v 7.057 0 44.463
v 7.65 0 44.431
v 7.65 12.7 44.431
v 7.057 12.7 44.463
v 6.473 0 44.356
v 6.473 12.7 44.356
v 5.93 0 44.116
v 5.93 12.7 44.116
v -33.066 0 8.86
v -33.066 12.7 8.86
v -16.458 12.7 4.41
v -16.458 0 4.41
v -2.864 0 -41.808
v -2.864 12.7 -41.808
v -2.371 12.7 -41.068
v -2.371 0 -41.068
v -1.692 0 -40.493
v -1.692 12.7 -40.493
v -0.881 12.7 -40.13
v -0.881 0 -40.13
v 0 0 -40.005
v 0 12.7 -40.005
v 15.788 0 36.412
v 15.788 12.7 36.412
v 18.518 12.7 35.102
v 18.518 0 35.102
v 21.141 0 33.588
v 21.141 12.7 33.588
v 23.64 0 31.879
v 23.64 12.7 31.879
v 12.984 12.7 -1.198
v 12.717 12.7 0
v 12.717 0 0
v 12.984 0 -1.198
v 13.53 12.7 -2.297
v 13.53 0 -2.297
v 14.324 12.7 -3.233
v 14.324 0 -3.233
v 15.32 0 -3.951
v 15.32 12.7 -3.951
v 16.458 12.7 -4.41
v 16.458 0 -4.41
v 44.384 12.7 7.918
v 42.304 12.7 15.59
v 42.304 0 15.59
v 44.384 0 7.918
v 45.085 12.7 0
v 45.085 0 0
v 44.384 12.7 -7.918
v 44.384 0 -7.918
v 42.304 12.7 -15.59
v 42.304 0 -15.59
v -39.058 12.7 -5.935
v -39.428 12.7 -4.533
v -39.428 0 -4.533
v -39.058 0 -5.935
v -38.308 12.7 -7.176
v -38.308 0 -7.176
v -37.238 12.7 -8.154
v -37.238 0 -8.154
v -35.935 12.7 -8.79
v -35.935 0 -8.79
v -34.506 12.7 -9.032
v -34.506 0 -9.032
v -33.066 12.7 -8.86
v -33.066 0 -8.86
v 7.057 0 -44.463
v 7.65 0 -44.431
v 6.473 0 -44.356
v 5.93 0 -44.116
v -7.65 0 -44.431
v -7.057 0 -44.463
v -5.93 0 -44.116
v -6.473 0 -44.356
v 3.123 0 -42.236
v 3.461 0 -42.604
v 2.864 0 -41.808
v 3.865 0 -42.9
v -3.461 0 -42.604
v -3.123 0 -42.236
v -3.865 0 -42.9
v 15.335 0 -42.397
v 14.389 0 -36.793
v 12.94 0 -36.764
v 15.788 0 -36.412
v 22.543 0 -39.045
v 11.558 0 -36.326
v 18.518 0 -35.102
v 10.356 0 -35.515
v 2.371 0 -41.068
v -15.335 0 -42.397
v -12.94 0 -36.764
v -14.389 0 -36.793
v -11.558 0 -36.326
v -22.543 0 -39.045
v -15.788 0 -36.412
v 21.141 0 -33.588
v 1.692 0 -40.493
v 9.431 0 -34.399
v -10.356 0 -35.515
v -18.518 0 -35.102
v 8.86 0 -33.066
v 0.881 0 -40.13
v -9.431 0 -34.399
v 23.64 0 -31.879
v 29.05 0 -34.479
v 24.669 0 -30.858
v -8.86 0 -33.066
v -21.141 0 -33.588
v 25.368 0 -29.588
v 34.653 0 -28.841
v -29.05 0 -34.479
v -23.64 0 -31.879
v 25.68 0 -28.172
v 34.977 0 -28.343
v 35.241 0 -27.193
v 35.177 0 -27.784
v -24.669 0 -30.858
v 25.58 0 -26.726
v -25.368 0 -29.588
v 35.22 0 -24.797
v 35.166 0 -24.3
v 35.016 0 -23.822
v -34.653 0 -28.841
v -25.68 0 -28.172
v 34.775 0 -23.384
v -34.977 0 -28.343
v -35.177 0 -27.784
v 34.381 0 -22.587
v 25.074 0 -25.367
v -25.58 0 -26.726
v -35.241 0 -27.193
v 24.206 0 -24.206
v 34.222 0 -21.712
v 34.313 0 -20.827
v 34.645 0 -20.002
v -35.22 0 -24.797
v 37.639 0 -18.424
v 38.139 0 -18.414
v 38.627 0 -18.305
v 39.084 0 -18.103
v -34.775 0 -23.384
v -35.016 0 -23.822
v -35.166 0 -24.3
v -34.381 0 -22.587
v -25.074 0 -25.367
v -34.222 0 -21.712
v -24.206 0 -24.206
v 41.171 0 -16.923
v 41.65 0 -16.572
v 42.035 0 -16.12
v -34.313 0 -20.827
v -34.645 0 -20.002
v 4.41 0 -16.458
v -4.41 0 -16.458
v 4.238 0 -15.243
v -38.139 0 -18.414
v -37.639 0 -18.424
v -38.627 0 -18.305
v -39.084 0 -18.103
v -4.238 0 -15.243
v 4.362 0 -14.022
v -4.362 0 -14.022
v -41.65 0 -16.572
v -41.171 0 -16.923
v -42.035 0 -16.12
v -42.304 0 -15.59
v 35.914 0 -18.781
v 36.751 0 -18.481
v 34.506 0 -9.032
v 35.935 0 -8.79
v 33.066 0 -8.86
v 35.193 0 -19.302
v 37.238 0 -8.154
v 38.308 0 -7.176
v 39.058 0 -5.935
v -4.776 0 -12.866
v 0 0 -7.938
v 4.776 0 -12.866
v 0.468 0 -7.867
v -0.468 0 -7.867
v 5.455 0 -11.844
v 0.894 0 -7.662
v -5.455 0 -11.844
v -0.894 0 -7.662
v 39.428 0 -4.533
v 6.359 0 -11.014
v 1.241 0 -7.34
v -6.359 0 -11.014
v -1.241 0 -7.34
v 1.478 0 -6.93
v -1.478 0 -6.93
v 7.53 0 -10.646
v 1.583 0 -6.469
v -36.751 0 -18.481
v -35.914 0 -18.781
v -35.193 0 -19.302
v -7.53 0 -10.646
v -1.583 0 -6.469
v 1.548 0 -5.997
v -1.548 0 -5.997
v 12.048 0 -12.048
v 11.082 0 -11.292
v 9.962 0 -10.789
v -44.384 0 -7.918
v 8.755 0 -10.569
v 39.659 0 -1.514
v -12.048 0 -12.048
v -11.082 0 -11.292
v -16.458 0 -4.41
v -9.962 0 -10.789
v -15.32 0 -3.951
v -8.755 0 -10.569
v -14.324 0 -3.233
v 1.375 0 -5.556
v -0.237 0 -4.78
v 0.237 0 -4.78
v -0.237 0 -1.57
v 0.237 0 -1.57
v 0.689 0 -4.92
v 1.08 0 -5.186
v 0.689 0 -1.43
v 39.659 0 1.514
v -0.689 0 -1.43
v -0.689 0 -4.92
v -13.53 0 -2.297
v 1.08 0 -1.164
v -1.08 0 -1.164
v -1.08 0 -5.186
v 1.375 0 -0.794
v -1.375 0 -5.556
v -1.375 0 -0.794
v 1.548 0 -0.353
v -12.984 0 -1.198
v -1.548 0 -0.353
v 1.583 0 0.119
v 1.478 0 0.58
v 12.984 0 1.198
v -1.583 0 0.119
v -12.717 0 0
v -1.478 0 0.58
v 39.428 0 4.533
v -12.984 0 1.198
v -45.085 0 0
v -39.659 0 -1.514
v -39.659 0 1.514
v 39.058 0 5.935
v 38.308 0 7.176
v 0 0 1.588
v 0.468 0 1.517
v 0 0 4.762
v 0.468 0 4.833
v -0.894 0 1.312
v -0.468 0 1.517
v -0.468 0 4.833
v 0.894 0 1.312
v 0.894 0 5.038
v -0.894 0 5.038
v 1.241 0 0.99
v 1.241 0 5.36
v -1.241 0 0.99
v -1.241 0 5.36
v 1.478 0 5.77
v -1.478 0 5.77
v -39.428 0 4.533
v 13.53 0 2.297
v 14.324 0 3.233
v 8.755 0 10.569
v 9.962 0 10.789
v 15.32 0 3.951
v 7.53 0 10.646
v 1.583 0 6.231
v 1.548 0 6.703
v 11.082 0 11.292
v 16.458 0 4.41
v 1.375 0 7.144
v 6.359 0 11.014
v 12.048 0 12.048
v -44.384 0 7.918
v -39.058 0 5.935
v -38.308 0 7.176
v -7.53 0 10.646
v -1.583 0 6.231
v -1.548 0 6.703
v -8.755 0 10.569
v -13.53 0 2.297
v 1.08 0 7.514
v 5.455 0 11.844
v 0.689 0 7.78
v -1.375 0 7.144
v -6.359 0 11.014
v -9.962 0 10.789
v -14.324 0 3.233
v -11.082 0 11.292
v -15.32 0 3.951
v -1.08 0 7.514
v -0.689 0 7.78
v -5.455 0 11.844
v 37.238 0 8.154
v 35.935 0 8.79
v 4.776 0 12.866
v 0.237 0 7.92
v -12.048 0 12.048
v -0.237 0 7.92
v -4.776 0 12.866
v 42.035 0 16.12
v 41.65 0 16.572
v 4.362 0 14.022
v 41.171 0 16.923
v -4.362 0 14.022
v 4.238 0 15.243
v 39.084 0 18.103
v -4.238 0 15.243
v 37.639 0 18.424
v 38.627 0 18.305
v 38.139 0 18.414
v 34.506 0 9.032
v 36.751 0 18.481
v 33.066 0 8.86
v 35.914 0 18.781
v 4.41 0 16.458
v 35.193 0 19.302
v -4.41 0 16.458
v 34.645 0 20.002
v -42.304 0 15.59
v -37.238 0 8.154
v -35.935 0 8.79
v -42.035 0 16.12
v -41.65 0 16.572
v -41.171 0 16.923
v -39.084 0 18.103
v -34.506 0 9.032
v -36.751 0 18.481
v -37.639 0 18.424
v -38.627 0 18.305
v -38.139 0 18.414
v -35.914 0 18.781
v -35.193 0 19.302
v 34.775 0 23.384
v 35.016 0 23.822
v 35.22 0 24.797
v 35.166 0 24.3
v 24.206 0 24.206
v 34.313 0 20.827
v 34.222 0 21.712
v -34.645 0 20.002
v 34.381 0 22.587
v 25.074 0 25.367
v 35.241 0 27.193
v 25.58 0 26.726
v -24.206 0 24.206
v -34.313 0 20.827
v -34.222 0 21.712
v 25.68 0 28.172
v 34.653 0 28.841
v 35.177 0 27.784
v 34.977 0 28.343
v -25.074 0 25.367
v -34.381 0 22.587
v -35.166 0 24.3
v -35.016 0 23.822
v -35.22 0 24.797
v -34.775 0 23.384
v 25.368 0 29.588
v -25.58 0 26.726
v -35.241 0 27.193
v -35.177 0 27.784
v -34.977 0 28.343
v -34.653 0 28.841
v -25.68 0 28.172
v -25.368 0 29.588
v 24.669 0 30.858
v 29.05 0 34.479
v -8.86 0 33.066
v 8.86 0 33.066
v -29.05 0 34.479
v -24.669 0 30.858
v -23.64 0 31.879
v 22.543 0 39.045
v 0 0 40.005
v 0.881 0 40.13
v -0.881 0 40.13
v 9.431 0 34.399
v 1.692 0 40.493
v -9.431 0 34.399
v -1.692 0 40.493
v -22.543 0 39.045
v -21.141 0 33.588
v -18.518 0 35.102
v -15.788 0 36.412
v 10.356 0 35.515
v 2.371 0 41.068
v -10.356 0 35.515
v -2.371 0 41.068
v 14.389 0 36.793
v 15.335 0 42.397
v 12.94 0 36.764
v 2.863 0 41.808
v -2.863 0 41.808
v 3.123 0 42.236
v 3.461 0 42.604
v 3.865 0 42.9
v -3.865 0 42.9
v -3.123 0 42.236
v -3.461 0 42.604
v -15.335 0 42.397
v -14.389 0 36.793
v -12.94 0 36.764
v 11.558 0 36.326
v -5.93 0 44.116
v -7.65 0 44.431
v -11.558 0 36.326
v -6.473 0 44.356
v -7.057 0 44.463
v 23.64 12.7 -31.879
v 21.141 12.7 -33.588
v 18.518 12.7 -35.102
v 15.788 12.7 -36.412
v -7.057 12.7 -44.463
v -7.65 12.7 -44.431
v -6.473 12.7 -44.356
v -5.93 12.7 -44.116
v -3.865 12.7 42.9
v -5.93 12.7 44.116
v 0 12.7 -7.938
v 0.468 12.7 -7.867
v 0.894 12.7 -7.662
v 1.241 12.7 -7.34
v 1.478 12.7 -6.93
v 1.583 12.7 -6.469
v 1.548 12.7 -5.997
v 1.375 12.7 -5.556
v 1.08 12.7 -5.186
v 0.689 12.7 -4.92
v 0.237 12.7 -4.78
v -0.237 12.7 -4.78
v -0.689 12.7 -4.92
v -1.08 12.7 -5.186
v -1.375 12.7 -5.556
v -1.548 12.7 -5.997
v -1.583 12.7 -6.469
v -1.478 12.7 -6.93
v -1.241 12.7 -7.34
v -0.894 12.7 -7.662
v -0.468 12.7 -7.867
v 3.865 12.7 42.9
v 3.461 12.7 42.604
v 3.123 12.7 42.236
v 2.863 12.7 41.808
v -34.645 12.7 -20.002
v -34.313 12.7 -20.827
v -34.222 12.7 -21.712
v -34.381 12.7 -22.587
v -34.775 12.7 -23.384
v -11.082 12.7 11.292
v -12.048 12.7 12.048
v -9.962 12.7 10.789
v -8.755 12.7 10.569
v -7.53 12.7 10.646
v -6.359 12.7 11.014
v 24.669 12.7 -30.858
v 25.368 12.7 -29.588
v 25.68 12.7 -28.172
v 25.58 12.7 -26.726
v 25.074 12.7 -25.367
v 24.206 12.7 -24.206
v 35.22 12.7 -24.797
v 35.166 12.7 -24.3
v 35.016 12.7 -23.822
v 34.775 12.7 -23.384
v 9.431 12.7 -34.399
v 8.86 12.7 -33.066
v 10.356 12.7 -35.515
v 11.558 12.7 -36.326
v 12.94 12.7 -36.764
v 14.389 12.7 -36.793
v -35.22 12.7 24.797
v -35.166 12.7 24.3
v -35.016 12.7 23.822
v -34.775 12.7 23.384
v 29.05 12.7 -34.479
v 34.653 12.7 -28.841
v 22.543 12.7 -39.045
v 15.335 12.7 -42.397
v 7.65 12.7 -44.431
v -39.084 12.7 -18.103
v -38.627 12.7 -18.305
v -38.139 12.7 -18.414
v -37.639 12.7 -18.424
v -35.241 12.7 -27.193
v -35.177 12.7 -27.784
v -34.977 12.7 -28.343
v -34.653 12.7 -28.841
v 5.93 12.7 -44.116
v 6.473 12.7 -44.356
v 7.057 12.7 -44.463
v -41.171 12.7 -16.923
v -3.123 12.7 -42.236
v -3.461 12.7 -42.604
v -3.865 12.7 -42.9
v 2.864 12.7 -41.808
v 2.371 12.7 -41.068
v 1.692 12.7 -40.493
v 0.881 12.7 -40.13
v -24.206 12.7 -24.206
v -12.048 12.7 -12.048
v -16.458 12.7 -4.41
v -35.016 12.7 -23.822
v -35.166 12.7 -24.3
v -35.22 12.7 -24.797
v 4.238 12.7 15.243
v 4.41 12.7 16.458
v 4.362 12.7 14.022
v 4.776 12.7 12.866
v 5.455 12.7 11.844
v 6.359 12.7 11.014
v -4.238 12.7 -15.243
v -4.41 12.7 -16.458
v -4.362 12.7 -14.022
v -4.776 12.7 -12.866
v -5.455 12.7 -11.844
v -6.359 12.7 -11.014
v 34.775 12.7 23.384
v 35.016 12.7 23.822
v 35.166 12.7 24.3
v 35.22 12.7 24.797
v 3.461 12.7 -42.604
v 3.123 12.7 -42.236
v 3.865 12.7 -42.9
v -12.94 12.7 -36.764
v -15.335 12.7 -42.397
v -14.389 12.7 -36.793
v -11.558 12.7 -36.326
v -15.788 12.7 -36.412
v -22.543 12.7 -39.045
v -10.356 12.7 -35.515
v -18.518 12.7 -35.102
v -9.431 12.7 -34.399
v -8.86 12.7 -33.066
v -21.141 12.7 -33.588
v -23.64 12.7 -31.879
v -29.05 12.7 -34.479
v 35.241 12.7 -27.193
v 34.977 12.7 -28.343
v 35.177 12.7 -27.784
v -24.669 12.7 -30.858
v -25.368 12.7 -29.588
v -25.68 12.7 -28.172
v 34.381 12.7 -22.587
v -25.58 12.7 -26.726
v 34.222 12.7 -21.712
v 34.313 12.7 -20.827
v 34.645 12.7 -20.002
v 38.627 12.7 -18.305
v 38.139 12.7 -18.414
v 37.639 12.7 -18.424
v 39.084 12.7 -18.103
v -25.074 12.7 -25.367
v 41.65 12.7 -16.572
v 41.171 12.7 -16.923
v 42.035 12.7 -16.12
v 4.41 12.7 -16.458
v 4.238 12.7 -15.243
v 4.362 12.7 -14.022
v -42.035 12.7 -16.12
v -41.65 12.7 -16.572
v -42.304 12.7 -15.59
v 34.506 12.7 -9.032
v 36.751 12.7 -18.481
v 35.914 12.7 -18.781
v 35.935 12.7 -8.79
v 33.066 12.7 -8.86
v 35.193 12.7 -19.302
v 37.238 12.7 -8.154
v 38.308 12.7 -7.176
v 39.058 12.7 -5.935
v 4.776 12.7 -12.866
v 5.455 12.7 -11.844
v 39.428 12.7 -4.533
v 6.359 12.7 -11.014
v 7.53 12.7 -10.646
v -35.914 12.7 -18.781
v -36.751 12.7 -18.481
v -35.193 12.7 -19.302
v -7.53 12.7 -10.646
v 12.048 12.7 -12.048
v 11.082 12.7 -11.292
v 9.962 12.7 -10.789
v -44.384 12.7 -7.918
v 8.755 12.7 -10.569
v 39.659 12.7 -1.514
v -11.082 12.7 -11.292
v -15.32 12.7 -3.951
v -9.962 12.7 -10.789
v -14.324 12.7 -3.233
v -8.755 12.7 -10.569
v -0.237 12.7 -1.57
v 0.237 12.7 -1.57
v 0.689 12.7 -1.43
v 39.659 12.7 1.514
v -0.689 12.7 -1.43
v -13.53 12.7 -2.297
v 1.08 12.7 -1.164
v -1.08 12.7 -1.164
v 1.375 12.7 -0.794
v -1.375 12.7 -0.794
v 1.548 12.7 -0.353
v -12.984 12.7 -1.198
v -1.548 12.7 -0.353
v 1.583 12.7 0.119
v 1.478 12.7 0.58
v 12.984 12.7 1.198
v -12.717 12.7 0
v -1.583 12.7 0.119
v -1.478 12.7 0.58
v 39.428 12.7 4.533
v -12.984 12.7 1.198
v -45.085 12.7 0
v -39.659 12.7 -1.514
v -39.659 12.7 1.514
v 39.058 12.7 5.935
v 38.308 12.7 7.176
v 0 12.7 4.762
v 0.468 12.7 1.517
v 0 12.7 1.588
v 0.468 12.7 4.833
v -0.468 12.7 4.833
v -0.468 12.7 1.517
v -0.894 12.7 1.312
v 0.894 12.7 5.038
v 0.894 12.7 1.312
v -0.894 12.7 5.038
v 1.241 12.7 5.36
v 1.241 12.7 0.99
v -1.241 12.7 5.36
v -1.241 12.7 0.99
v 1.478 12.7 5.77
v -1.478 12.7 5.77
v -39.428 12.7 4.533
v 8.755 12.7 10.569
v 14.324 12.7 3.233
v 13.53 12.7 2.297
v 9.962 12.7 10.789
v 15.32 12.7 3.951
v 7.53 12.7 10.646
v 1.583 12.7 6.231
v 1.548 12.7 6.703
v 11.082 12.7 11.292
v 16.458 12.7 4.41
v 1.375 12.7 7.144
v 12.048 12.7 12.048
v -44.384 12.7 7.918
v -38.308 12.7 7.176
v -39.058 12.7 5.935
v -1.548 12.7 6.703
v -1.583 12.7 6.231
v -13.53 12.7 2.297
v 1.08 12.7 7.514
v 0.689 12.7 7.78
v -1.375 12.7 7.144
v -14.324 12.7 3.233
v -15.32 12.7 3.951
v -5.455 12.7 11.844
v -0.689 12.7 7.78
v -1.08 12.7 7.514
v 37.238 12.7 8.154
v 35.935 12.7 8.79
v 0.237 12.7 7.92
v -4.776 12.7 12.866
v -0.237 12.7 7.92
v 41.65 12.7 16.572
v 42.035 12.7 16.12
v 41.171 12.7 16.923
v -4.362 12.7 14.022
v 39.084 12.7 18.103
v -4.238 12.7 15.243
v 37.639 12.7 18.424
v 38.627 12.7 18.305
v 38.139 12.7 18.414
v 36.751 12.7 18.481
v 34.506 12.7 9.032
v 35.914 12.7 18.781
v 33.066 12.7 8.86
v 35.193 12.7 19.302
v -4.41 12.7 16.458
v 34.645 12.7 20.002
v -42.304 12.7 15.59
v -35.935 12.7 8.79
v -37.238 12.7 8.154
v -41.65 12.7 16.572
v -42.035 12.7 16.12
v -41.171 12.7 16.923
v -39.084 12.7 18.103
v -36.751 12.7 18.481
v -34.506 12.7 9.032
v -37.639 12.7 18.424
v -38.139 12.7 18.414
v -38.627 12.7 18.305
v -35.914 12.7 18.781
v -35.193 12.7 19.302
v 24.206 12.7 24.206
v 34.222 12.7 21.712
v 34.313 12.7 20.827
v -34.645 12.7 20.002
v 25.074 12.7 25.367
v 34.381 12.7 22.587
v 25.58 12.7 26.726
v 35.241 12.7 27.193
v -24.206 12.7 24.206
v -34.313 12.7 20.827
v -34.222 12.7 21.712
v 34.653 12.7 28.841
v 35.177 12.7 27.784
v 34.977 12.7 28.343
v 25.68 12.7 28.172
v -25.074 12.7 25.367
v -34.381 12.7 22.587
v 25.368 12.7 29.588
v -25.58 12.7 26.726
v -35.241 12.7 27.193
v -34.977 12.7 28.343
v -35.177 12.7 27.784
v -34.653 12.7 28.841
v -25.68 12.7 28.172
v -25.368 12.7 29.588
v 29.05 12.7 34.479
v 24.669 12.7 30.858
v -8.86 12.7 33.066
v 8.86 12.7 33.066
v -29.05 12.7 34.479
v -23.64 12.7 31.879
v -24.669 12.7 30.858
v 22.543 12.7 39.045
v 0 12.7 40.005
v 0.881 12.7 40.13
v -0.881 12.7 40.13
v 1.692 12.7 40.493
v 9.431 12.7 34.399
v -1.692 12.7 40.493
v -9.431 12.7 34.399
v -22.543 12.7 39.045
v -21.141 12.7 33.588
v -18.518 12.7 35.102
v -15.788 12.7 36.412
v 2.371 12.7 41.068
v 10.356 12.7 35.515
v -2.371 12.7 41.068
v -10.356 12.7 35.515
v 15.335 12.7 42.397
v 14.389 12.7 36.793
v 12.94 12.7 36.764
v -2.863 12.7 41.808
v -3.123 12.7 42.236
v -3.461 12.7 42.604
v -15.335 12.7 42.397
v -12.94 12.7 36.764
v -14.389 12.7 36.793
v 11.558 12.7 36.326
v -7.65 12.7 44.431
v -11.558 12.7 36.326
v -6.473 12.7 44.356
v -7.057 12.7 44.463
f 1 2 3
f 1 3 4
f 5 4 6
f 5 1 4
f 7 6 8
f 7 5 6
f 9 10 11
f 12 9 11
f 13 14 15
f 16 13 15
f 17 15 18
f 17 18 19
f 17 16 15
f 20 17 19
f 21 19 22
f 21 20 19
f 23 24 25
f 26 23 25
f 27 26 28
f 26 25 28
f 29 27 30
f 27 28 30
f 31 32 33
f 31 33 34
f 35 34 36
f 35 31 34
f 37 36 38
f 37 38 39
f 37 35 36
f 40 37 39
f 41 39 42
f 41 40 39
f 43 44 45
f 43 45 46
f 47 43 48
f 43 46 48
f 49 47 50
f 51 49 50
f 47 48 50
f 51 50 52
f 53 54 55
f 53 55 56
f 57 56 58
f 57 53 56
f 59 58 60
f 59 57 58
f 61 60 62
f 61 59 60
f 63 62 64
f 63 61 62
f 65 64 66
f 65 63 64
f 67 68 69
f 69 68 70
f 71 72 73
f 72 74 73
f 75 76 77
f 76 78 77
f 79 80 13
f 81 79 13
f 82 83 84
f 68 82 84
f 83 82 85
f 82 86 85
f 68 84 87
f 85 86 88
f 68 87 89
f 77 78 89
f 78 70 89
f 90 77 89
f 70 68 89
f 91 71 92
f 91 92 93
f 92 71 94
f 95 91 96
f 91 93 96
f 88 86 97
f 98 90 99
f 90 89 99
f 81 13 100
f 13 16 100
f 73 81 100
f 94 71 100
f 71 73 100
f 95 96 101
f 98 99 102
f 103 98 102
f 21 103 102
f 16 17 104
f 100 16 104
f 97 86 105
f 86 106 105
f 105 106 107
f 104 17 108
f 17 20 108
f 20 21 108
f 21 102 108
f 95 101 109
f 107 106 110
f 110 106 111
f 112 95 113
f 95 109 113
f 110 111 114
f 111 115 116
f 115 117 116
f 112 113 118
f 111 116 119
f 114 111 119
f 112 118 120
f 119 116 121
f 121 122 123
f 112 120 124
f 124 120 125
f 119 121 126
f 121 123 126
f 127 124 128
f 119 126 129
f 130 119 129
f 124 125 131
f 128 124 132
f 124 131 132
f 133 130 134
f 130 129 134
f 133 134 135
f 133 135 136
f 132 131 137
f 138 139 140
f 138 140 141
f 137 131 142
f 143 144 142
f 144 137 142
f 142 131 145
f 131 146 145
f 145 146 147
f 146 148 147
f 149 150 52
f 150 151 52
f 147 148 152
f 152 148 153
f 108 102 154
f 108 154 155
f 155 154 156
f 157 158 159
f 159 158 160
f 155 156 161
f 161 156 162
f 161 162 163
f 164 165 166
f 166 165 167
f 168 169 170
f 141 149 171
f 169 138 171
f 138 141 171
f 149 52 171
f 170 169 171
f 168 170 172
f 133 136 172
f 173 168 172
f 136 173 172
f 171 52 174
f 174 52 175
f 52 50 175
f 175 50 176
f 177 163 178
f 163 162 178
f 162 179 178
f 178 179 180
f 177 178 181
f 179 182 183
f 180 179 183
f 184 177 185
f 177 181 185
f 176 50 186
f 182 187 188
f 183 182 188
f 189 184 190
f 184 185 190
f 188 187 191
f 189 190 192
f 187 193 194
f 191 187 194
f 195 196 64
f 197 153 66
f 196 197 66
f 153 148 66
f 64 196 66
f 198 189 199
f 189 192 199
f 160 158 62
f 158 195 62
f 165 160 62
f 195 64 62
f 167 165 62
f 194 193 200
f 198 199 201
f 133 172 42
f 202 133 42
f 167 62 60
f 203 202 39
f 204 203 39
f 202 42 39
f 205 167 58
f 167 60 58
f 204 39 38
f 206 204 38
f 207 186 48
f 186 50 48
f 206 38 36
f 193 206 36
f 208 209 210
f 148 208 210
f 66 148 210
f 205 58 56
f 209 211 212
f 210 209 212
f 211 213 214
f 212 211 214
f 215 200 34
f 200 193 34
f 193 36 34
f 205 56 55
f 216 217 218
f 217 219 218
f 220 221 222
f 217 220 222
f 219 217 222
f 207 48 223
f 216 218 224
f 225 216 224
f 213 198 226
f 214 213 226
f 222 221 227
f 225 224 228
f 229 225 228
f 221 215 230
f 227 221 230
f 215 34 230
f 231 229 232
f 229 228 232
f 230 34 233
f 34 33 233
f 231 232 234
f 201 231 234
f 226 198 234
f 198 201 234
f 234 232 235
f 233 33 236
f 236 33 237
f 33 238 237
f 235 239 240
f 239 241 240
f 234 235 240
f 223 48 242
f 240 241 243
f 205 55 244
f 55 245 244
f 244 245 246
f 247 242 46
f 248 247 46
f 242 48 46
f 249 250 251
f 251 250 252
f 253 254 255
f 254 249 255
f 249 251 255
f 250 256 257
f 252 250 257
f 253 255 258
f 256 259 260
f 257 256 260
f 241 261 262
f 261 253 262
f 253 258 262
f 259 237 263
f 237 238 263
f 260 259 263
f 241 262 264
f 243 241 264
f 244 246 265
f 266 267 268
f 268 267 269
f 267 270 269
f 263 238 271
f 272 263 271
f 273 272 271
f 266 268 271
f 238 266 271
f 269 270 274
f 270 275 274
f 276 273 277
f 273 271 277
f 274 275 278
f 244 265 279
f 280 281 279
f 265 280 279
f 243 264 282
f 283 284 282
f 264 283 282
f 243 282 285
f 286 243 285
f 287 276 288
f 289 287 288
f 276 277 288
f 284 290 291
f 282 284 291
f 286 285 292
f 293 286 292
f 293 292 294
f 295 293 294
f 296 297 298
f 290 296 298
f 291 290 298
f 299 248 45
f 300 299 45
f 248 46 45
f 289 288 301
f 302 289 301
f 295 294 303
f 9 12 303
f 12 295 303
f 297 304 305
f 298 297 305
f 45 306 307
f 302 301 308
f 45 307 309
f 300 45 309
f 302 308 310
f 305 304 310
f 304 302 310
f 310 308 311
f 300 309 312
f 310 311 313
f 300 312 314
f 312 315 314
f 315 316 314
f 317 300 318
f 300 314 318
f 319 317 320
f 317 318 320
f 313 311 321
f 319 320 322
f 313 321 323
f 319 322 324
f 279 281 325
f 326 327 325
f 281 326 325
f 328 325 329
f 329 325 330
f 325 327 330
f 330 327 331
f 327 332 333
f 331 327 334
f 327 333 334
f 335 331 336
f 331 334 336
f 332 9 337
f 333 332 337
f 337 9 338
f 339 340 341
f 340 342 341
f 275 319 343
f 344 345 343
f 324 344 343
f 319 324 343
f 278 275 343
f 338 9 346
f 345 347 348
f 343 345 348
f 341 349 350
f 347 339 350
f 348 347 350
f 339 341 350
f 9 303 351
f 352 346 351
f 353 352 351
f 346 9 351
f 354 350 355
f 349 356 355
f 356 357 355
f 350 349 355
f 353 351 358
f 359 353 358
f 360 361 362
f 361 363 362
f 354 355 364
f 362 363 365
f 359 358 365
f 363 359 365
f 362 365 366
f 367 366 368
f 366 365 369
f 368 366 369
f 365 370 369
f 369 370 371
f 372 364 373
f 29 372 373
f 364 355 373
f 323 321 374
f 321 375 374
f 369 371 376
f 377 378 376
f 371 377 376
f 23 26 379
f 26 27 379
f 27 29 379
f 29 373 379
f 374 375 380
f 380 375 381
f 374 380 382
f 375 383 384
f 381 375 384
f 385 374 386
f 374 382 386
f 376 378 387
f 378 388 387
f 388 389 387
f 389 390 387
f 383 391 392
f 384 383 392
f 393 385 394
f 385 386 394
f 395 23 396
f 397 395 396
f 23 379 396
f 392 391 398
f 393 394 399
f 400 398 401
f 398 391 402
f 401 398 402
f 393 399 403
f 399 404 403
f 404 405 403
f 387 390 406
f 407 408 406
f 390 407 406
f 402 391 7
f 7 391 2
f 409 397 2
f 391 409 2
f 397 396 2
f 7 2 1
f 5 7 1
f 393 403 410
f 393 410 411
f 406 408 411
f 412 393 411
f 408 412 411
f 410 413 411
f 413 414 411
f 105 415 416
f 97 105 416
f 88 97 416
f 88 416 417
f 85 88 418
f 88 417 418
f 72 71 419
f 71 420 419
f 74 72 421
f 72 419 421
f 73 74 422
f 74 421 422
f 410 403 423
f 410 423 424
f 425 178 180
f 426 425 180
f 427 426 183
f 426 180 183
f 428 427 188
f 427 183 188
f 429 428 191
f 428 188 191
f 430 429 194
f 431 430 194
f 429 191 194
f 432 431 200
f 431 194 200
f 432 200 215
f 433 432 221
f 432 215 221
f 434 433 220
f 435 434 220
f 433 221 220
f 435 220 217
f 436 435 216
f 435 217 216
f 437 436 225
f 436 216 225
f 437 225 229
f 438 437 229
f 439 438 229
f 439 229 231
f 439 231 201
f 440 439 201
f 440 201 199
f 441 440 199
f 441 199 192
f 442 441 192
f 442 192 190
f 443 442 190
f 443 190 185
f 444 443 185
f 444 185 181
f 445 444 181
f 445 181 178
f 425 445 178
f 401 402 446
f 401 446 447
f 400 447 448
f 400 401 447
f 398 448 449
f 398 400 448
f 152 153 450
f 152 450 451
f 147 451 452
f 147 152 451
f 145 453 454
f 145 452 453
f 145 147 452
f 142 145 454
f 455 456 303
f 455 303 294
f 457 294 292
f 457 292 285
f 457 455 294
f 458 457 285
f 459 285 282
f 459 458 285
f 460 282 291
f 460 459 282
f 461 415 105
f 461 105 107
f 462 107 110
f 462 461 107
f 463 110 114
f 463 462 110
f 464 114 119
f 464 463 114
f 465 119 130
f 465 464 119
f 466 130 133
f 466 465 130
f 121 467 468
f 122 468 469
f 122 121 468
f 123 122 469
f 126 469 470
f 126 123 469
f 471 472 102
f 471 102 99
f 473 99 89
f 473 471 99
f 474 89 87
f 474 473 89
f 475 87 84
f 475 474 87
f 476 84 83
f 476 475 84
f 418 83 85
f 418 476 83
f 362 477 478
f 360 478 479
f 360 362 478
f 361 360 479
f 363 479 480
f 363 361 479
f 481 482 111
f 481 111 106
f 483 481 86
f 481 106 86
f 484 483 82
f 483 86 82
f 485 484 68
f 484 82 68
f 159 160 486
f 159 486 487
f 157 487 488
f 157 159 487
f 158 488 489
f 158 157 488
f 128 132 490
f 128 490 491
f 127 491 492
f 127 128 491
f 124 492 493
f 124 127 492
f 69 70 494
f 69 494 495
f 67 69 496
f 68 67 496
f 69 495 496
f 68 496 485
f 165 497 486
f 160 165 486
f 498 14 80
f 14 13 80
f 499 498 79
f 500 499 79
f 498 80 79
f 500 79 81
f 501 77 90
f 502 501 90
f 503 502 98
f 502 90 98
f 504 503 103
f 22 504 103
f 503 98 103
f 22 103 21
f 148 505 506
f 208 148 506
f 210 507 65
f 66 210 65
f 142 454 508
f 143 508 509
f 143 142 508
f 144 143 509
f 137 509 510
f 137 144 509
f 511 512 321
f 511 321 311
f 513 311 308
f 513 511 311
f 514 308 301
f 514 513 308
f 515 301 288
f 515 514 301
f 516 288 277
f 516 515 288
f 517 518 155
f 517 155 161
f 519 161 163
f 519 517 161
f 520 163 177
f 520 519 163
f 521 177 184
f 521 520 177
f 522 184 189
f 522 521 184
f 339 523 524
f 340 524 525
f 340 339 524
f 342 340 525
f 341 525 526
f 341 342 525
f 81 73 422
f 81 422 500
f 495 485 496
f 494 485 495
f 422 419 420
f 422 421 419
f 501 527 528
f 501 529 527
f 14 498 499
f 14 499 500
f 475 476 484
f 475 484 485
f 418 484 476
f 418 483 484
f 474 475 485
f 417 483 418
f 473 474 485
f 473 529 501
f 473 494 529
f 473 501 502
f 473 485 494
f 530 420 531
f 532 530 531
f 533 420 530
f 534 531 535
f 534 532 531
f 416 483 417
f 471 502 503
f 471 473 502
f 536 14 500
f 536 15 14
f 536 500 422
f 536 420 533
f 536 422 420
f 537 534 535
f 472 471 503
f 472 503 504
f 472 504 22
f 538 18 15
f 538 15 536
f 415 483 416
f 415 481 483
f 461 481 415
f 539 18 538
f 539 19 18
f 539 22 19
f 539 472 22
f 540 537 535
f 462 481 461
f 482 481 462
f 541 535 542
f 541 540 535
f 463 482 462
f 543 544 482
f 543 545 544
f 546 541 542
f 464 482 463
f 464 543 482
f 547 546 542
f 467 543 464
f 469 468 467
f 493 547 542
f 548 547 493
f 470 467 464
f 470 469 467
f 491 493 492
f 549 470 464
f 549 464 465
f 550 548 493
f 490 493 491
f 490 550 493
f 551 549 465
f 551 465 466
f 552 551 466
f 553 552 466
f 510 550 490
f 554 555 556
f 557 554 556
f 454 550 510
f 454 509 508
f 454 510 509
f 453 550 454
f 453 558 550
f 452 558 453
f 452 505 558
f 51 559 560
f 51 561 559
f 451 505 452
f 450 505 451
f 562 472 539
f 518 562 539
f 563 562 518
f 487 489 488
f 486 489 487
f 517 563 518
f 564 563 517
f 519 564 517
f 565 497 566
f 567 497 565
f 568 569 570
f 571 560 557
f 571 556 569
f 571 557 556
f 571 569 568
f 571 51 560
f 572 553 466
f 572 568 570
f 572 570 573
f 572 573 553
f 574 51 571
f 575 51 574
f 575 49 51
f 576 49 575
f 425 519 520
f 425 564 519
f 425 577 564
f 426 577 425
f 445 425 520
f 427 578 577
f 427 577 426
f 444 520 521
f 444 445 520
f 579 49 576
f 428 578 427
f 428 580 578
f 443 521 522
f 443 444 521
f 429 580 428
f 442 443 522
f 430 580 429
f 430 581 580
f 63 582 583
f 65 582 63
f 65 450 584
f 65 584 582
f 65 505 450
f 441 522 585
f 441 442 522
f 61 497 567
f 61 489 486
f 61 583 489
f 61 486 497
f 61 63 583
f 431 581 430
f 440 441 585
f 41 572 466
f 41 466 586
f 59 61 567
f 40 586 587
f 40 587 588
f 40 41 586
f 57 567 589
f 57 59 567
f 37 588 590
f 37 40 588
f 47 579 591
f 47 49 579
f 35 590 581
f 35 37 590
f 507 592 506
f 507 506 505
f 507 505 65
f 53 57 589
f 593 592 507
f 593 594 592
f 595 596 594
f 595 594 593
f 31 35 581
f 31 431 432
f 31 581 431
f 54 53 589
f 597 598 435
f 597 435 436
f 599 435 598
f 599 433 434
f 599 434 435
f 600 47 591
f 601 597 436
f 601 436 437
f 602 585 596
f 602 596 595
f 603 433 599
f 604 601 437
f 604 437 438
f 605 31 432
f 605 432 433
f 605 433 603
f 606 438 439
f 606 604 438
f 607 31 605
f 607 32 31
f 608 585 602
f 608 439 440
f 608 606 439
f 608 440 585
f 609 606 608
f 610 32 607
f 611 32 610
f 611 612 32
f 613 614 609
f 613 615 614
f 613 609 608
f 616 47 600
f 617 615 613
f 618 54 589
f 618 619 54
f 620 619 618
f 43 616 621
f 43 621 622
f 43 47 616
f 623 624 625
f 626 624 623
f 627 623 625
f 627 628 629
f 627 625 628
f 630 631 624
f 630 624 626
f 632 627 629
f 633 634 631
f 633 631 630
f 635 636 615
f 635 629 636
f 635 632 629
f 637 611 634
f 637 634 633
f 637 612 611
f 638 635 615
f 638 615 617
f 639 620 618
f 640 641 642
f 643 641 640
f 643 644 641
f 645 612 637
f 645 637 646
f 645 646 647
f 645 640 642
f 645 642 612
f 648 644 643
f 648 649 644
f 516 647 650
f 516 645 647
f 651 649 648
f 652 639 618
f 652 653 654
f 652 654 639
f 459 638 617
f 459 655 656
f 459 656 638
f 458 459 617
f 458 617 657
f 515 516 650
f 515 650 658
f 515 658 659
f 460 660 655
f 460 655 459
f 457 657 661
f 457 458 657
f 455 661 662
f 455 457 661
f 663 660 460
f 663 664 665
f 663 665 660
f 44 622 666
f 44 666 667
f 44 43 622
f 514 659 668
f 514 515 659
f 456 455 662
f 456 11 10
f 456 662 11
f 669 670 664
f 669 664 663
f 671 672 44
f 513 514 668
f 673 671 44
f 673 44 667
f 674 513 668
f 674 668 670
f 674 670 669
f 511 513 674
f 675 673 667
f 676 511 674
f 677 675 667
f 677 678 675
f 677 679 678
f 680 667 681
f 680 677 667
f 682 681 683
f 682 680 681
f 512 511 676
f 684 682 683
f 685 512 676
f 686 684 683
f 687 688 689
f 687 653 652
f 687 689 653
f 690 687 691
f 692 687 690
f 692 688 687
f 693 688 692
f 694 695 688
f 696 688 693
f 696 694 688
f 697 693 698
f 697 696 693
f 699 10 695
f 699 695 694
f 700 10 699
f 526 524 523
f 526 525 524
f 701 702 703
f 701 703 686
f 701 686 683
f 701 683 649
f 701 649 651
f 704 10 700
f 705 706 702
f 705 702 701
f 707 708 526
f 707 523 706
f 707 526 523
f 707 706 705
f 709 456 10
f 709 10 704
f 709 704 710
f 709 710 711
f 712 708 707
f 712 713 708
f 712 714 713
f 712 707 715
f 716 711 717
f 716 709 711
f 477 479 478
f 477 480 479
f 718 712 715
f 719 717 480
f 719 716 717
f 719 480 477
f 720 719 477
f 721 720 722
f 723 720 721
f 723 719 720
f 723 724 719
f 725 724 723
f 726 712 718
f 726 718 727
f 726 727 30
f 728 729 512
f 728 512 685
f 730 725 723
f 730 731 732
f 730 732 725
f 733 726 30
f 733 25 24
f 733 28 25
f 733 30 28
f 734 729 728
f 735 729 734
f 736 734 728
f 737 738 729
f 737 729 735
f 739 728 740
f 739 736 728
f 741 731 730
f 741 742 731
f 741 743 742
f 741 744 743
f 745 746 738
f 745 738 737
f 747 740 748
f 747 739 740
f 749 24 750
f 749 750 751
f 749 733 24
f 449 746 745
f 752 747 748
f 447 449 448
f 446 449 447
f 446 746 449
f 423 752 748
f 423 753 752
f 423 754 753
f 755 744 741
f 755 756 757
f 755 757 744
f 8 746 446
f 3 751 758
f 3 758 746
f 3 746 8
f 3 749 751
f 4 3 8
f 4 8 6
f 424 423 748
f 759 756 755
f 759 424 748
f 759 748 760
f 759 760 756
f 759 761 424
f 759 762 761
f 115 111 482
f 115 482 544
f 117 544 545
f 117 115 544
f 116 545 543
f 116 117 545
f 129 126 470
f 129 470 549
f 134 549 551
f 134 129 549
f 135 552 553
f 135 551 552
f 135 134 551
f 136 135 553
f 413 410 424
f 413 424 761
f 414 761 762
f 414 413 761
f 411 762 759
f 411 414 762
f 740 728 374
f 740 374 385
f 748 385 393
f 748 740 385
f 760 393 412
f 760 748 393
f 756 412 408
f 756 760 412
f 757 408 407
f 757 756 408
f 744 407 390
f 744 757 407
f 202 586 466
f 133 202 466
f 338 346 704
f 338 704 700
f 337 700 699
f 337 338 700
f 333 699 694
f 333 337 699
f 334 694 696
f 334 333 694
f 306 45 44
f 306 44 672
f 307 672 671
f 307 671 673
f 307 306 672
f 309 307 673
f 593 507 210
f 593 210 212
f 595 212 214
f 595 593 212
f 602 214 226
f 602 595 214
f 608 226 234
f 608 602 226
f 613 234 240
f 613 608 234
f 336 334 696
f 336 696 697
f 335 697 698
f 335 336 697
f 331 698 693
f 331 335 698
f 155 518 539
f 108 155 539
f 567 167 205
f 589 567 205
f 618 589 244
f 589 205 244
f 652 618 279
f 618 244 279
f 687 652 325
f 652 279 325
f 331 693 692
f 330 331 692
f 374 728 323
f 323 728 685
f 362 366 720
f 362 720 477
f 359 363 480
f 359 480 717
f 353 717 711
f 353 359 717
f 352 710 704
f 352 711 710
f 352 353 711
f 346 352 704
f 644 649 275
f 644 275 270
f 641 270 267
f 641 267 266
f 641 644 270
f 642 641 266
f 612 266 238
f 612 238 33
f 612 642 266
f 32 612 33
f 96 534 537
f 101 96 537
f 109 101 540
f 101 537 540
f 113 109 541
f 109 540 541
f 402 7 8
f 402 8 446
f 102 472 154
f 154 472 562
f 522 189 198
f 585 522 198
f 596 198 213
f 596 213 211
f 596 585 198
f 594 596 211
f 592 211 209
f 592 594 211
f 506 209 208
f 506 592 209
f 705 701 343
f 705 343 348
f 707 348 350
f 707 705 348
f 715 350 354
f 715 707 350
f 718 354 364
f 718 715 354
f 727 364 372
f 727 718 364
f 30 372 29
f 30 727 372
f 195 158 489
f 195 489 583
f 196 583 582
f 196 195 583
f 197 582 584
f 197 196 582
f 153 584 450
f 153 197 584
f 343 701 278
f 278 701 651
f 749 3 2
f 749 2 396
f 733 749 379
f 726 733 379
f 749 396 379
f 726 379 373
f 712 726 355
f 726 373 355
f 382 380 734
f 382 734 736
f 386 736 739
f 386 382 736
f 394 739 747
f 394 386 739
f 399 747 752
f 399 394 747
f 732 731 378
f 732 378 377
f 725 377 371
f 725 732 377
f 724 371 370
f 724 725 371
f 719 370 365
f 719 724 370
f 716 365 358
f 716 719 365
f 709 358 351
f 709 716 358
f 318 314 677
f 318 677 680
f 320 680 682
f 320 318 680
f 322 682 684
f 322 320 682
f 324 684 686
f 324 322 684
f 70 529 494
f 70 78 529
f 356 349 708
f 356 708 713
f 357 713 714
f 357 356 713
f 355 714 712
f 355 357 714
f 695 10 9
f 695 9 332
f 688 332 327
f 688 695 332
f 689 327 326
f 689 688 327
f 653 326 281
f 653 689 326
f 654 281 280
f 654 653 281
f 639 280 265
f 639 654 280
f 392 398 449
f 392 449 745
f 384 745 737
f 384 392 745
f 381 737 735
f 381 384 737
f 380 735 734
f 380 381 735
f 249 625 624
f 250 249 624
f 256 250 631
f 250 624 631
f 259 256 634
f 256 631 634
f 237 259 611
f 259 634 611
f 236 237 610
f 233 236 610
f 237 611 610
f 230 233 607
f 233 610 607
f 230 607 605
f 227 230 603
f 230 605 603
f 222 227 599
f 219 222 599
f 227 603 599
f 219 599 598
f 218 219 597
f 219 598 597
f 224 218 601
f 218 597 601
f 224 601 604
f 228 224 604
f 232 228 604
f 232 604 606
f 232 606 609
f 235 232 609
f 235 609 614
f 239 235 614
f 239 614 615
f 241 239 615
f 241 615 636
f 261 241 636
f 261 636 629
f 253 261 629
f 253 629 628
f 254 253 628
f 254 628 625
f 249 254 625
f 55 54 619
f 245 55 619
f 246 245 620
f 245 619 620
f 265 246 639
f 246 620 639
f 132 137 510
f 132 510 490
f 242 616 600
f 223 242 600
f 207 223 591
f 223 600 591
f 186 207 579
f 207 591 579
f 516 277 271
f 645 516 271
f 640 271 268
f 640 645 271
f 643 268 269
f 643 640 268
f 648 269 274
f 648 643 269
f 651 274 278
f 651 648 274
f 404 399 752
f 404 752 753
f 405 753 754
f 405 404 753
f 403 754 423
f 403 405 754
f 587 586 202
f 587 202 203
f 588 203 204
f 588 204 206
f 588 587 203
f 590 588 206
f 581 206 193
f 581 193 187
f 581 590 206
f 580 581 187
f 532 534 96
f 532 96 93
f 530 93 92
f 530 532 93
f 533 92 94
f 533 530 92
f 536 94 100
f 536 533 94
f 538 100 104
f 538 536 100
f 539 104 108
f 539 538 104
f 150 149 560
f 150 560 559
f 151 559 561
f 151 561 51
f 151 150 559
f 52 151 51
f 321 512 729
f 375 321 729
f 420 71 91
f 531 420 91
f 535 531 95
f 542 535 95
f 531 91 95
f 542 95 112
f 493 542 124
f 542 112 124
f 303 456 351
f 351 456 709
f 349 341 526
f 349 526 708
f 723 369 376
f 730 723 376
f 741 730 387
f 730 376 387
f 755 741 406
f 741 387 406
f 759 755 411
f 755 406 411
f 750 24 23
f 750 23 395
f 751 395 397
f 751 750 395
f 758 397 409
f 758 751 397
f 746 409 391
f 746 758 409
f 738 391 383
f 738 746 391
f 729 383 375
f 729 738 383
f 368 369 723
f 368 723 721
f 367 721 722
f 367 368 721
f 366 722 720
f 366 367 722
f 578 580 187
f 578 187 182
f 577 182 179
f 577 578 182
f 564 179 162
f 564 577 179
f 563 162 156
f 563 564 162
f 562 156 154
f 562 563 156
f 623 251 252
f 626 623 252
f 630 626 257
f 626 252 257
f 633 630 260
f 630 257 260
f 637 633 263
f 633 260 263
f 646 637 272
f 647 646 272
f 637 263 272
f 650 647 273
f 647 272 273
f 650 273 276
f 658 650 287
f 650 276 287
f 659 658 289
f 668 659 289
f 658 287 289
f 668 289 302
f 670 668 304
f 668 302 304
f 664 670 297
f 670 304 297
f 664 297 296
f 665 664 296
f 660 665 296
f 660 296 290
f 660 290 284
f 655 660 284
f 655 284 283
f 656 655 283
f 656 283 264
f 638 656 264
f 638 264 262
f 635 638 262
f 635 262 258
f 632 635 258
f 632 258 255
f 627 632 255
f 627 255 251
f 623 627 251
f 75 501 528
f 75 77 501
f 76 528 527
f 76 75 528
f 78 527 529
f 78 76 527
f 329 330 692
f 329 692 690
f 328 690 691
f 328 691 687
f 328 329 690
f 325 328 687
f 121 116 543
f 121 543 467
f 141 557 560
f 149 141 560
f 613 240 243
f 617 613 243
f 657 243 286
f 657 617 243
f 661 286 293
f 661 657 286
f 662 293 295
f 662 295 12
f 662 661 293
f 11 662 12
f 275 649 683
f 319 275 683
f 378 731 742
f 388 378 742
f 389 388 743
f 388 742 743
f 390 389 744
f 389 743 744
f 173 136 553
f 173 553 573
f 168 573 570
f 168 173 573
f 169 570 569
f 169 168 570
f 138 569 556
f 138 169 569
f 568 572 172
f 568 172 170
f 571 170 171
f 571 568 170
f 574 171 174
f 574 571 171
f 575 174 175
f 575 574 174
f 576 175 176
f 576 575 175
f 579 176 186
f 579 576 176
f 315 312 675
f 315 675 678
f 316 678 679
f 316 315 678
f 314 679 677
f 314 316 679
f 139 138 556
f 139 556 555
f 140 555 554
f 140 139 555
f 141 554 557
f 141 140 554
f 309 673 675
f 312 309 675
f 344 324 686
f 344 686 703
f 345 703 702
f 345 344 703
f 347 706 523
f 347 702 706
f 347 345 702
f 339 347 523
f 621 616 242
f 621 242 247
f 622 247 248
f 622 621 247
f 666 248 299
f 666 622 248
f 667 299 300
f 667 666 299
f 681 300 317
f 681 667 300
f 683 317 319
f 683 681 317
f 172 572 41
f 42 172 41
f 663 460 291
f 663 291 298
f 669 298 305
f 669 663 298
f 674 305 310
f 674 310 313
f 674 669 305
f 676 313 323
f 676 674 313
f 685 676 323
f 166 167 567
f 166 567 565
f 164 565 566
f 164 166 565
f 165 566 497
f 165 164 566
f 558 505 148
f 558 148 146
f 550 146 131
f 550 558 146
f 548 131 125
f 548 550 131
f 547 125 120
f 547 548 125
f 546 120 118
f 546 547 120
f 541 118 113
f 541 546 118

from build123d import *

# Parameters (mm, degrees)
SKETCH1_R                = 45.085
BOSS_EXTRUDE1_DEPTH      = 12.7
SKETCH2_W                = 6.35
SKETCH2_H                = 6.35
CUT_EXTRUDE1_DEPTH       = 25.4
FILLET1_R                = 3.175
SKETCH3_R                = 1.5875
CUT_EXTRUDE2_DEPTH       = 25.4
CUT_EXTRUDE4_DEPTH       = 25.4
FILLET4_R                = 5.08
CIRPATTERN3_COUNT        = 6
FILLET4_OF_CIRPATTERN3_R = 5.08
SKETCH5_R                = 1.5875
CUT_EXTRUDE5_DEPTH       = 15.24
CHAMFER1_START           = -1
CHAMFER1_DEPTH           = 15
FILLET5_R                = 2.54
CIRPATTERN7_START        = -1
CIRPATTERN7_DEPTH        = 15


with BuildPart() as part:
    # Sketch1 → Boss-Extrude1 (new body)
    with BuildSketch(Plane(origin=(0, 0, 0), x_dir=(1, 0, 0), z_dir=(0, 1, 0))):
        with Locations(Location((0, 0, 0), (0, 0, 270))):
            Circle(SKETCH1_R)
    extrude(amount=BOSS_EXTRUDE1_DEPTH)

    # Sketch2 → Cut-Extrude1 (cut)
    with BuildSketch(Plane(origin=(0, 12.7, 0), x_dir=(1, 0, 0), z_dir=(0, 1, 0))):
        with Locations((0, 43.18)):
            Rectangle(SKETCH2_W, SKETCH2_H)
    extrude(amount=-CUT_EXTRUDE1_DEPTH, mode=Mode.SUBTRACT)

    # Fillet1
    fillet1_edges = [part.edges().sort_by_distance(p)[0] for p in [
        (3.175, 6.35, -40.005),
        (-3.175, 6.35, -40.005),
    ]]
    fillet(fillet1_edges, radius=FILLET1_R - 0.0001)  # a hair under: the kernel refuses the full size

    # Sketch3 → Cut-Extrude2 (cut)
    with BuildSketch(Plane(origin=(0, 12.7, 0), x_dir=(1, 0, 0), z_dir=(0, 1, 0))):
        with Locations(Location((0, 0, 0), (0, 0, 270))):
            Circle(SKETCH3_R)
    extrude(amount=-CUT_EXTRUDE2_DEPTH, mode=Mode.SUBTRACT)

    # Sketch4 → Cut-Extrude4 (cut)
    with BuildSketch(Plane(origin=(0, 12.7, 0), x_dir=(1, 0, 0), z_dir=(0, 1, 0))):
        with BuildLine():
            Line((10.271880853, 38.335181231), (3.287001873, 12.267257994))
            ThreePointArc((3.287001873, 12.267257994), (6.35, 10.998522628), (8.980256121, 8.980256121))
            Line((8.980256121, 8.980256121), (28.063300378, 28.063300378))
            ThreePointArc((28.063300378, 28.063300378), (19.84375, 34.370383213), (10.271880853, 38.335181231))
        make_face()
    cut_extrude4 = extrude(amount=-CUT_EXTRUDE4_DEPTH, mode=Mode.SUBTRACT)

    # Fillet4
    # the kernel refuses this fillet: 5.08 mm, written as the material it adds along each edge
    with BuildSketch(Plane(origin=(8.980256121, 12.7, -8.980256121), x_dir=(0.707106781186551, 0, -0.7071067811865441), z_dir=(0, -1, 0))) as fillet4_piece_1:
        with BuildLine():
            CenterArc((4.338837989, -5.08), FILLET4_R, 90, 73.398450401)
            ThreePointArc((-0.529401437, -3.628571429), (-0.133047272, -1.833493693), (0, 0))
            Line((0, 0), (4.338837989, 0))
        make_face()
    extrude(amount=12.7)
    with BuildSketch(Plane(origin=(3.287001873, 12.7, -12.267257994), x_dir=(0.2588190451024908, 0, -0.9659258262890763), z_dir=(0, -1, 0))) as fillet4_piece_2:
        with BuildLine():
            CenterArc((4.338837989, 5.08), FILLET4_R, 196.601549599, 73.398450401)
            ThreePointArc((-0.529401437, 3.628571429), (-0.133047272, 1.833493693), (0, 0))
            Line((0, 0), (4.338837989, 0))
        make_face()
    extrude(amount=12.7)
    with BuildSketch(Plane(origin=(28.063300378, 12.7, -28.063300378), x_dir=(-0.7071067811865437, 0, 0.7071067811865515), z_dir=(0, -1, 0))) as fillet4_piece_3:
        with BuildLine():
            CenterArc((5.454874389, 5.08), FILLET4_R, 171.559110559, 98.440889441)
            ThreePointArc((0.429901822, 5.825688073), (0.107621375, 2.920764331), (0, 0))
            Line((0, 0), (5.454874389, 0))
        make_face()
    extrude(amount=12.7)
    with BuildSketch(Plane(origin=(10.271880853, 12.7, -38.335181231), x_dir=(0.9442589613921284, 0, 0.3292036054338696), z_dir=(0, -1, 0))) as fillet4_piece_4:
        with BuildLine():
            CenterArc((5.467670827, 5.066224464), FILLET4_R, 175.779555279, 98.440889441)
            Line((0.401446363, 5.440082298), (0, 0))
            ThreePointArc((0, 0), (2.920764331, -0.107621375), (5.841528662, 0))
        make_face()
    extrude(amount=12.7)

    # CirPattern3: Cut-Extrude4 ×6 about axis
    cirpattern3_axis = Axis((0, 0, 0), (0, 1, 0))
    for i in range(1, CIRPATTERN3_COUNT):
        add(cut_extrude4.rotate(cirpattern3_axis, i * 360 / CIRPATTERN3_COUNT), mode=Mode.SUBTRACT)

    # Fillet4 of CirPattern3
    # the kernel refuses this fillet: 5.08 mm, written as the material it adds along each edge
    with BuildSketch(Plane(origin=(-3.287001873, 12.7, -12.267257994), x_dir=(-0.25881904510251585, 0, -0.9659258262890695), z_dir=(0, -1, 0)), Plane(origin=(-12.267257994, 12.7, -3.287001873), x_dir=(-0.965925826289067, 0, -0.2588190451025258), z_dir=(0, -1, 0)), Plane(origin=(-8.980256121, 12.7, 8.980256121), x_dir=(-0.7071067811865508, 0, 0.7071067811865442), z_dir=(0, -1, 0)), Plane(origin=(3.287001873, 12.7, 12.267257994), x_dir=(0.2588190451025157, 0, 0.9659258262890696), z_dir=(0, -1, 0)), Plane(origin=(12.267257994, 12.7, 3.287001873), x_dir=(0.9659258262890671, 0, 0.25881904510252524), z_dir=(0, -1, 0))) as fillet4_of_cirpattern3_piece_1:
        with BuildLine():
            CenterArc((4.338837989, -5.08), FILLET4_OF_CIRPATTERN3_R, 90, 73.398450401)
            ThreePointArc((-0.529401437, -3.628571429), (-0.133047272, -1.833493693), (0, 0))
            Line((0, 0), (4.338837989, 0))
        make_face()
    extrude(amount=12.7)
    with BuildSketch(Plane(origin=(-8.980256121, 12.7, -8.980256121), x_dir=(0.801783725737267, 0, -0.5976143046672051), z_dir=(0, -1, 0)), Plane(origin=(-12.267257994, 12.7, 3.287001873), x_dir=(-0.1166573066381411, 0, -0.9931722271630106), z_dir=(0, -1, 0)), Plane(origin=(-3.287001873, 12.7, 12.267257994), x_dir=(-0.9184410323754069, 0, -0.39555792249580446), z_dir=(0, -1, 0)), Plane(origin=(8.980256121, 12.7, 8.980256121), x_dir=(-0.8017837257372662, 0, 0.5976143046672062), z_dir=(0, -1, 0))) as fillet4_of_cirpattern3_piece_2:
        with BuildLine():
            CenterArc((4.400384864, -5.026781091), FILLET4_OF_CIRPATTERN3_R, 98.3007748, 73.398450401)
            Line((-0.626396227, -4.293383614), (0, 0))
            ThreePointArc((0, 0), (1.833493693, -0.133047272), (3.666987387, 0))
        make_face()
    extrude(amount=12.7)
    with BuildSketch(Plane(origin=(-10.271880853, 12.7, -38.335181231), x_dir=(0.25881904510252557, 0, 0.9659258262890671), z_dir=(0, -1, 0)), Plane(origin=(-38.335181231, 12.7, -10.271880853), x_dir=(0.9659258262890696, 0, 0.25881904510251547), z_dir=(0, -1, 0)), Plane(origin=(-28.063300378, 12.7, 28.063300378), x_dir=(0.7071067811865429, 0, -0.707106781186552), z_dir=(0, -1, 0)), Plane(origin=(10.271880853, 12.7, 38.335181231), x_dir=(-0.2588190451025262, 0, -0.9659258262890669), z_dir=(0, -1, 0)), Plane(origin=(38.335181231, 12.7, 10.271880853), x_dir=(-0.9659258262890699, 0, -0.25881904510251486), z_dir=(0, -1, 0))) as fillet4_of_cirpattern3_piece_3:
        with BuildLine():
            CenterArc((5.454874389, 5.08), FILLET4_OF_CIRPATTERN3_R, 171.559110559, 98.440889441)
            ThreePointArc((0.429901822, 5.825688073), (0.107621375, 2.920764331), (0, 0))
            Line((0, 0), (5.454874389, 0))
        make_face()
    extrude(amount=12.7)
    with BuildSketch(Plane(origin=(-28.063300378, 12.7, -28.063300378), x_dir=(0.757228166019224, 0, -0.653150445599758), z_dir=(0, -1, 0)), Plane(origin=(-38.335181231, 12.7, 10.271880853), x_dir=(-0.18703079537290557, 0, -0.9823540510336272), z_dir=(0, -1, 0)), Plane(origin=(-10.271880853, 12.7, 38.335181231), x_dir=(-0.9442589613921285, 0, -0.32920360543386923), z_dir=(0, -1, 0)), Plane(origin=(28.063300378, 12.7, 28.063300378), x_dir=(-0.7572281660192255, 0, 0.6531504455997565), z_dir=(0, -1, 0)), Plane(origin=(38.335181231, 12.7, -10.271880853), x_dir=(0.1870307953729042, 0, 0.9823540510336275), z_dir=(0, -1, 0))) as fillet4_of_cirpattern3_piece_4:
        with BuildLine():
            CenterArc((5.467670827, 5.066224464), FILLET4_OF_CIRPATTERN3_R, 175.779555279, 98.440889441)
            Line((0.401446363, 5.440082298), (0, 0))
            ThreePointArc((0, 0), (2.920764331, -0.107621375), (5.841528662, 0))
        make_face()
    extrude(amount=12.7)
    with BuildSketch(Plane(origin=(12.267257994, 12.7, -3.287001873), x_dir=(0.9659258262890604, 0, -0.25881904510255027), z_dir=(0, -1, 0))) as fillet4_of_cirpattern3_piece_5:
        with BuildLine():
            CenterArc((4.338837989, 5.08), FILLET4_OF_CIRPATTERN3_R, 196.601549599, 73.398450401)
            ThreePointArc((-0.529401437, 3.628571429), (-0.133047272, 1.833493693), (0, 0))
            Line((0, 0), (4.338837989, 0))
        make_face()
    extrude(amount=12.7)

    # Sketch5 → Cut-Extrude5 (cut)
    with BuildSketch(Plane.XZ):
        with Locations(Location((0, 6.35, 0), (0, 0, 270))):
            Circle(SKETCH5_R)
        with Locations(Location((0, -6.35, 0), (0, 0, 270))):
            Circle(SKETCH5_R)
    extrude(amount=-CUT_EXTRUDE5_DEPTH, mode=Mode.SUBTRACT)

    # Chamfer1: read off the stored shape, not the designer's step
    # Chamfer1 outline → Chamfer1 (cut)
    with BuildSketch(Plane(origin=(0, 0, 0), x_dir=(1, 0, 0), z_dir=(0, 1, 0)).offset(CHAMFER1_START)):
        with BuildLine():
            Line((-6.718968573, 44.581528532), (-3.087994239, 42.441815348))
            ThreePointArc((-3.087994239, 42.441815348), (-3.153173537, 42.808352794), (-3.175, 43.18))
            Line((-3.175, 43.18), (-3.175, 44.973065272))
            ThreePointArc((-3.175, 44.973065272), (-4.950856369, 44.812344797), (-6.718968573, 44.581528532))
        make_face()
        with BuildLine():
            Line((3.087994239, 42.441815348), (6.718968573, 44.581528532))
            ThreePointArc((6.718968573, 44.581528532), (4.950856369, 44.812344797), (3.175, 44.973065272))
            Line((3.175, 44.973065272), (3.175, 43.18))
            ThreePointArc((3.175, 43.18), (3.153173537, 42.808352794), (3.087994239, 42.441815348))
        make_face()
    extrude(amount=CHAMFER1_DEPTH, mode=Mode.SUBTRACT)

    # Fillet5
    fillet5_edges = [part.edges().sort_by_distance(p)[0] for p in [
        (6.718968573, 6.35, -44.581528532),
        (-6.718968573, 6.35, -44.581528532),
        (-3.088018782, 6.35, -42.441829811),
        (3.088018782, 6.35, -42.441829811),
    ]]
    fillet(fillet5_edges, radius=FILLET5_R)

    # CirPattern7: read off the stored shape, not the designer's step
    # CirPattern7 outline → CirPattern7 (cut)
    with BuildSketch(Plane(origin=(0, 0, 0), x_dir=(1, 0, 0), z_dir=(0, 1, 0)).offset(CIRPATTERN7_START)):
        with BuildLine():
            ThreePointArc((41.170667008, 16.92300591), (41.855471454, 16.357303704), (42.303623317, 15.590403436))
            ThreePointArc((42.303623317, 15.590403436), (39.04475533, 22.5425), (34.653497089, 28.840810746))
            ThreePointArc((34.653497089, 28.840810746), (35.093576272, 28.069249714), (35.24108653, 27.193340565))
            Line((35.24108653, 27.193340565), (35.219727473, 24.796698321))
            ThreePointArc((35.219727473, 24.796698321), (35.102820214, 24.057290552), (34.775449936, 23.384074497))
            ThreePointArc((34.775449936, 23.384074497), (34.222324259, 21.71206554), (34.645346278, 20.0025))
            ThreePointArc((34.645346278, 20.0025), (35.914362456, 18.781369415), (37.638927526, 18.424385824))
            ThreePointArc((37.638927526, 18.424385824), (38.385634871, 18.371288774), (39.084434412, 18.102829545))
            Line((39.084434412, 18.102829545), (41.170667008, 16.92300591))
        make_face()
        with BuildLine():
            ThreePointArc((35.24108653, -27.193340565), (35.093576272, -28.069249714), (34.653497089, -28.840810746))
            ThreePointArc((34.653497089, -28.840810746), (39.04475533, -22.5425), (42.303623317, -15.590403436))
            ThreePointArc((42.303623317, -15.590403436), (41.855471454, -16.357303704), (41.170667008, -16.92300591))
            Line((41.170667008, -16.92300591), (39.084434412, -18.102829545))
            ThreePointArc((39.084434412, -18.102829545), (38.385634871, -18.371288774), (37.638927526, -18.424385824))
            ThreePointArc((37.638927526, -18.424385824), (35.914362456, -18.781369415), (34.645346278, -20.0025))
            ThreePointArc((34.645346278, -20.0025), (34.222324259, -21.71206554), (34.775449936, -23.384074497))
            ThreePointArc((34.775449936, -23.384074497), (35.102820214, -24.057290552), (35.219727473, -24.796698321))
            Line((35.219727473, -24.796698321), (35.24108653, -27.193340565))
        make_face()
        with BuildLine():
            ThreePointArc((-5.929580478, -44.116346474), (-6.761895182, -44.426553418), (-7.650126228, -44.431214182))
            ThreePointArc((-7.650126228, -44.431214182), (0, -45.085), (7.650126228, -44.431214182))
            ThreePointArc((7.650126228, -44.431214182), (6.761895182, -44.426553418), (5.929580478, -44.116346474))
            Line((5.929580478, -44.116346474), (3.864706939, -42.899527866))
            ThreePointArc((3.864706939, -42.899527866), (3.282814657, -42.428579326), (2.86347759, -41.808460321))
            ThreePointArc((2.86347759, -41.808460321), (1.692038197, -40.493434955), (0, -40.005))
            ThreePointArc((0, -40.005), (-1.692038197, -40.493434955), (-2.86347759, -41.808460321))
            ThreePointArc((-2.86347759, -41.808460321), (-3.282814657, -42.428579326), (-3.864706939, -42.899527866))
            Line((-3.864706939, -42.899527866), (-5.929580478, -44.116346474))
        make_face()
        with BuildLine():
            ThreePointArc((-41.170667008, -16.92300591), (-41.855471454, -16.357303704), (-42.303623317, -15.590403436))
            ThreePointArc((-42.303623317, -15.590403436), (-39.04475533, -22.5425), (-34.653497089, -28.840810746))
            ThreePointArc((-34.653497089, -28.840810746), (-35.093576272, -28.069249714), (-35.24108653, -27.193340565))
            Line((-35.24108653, -27.193340565), (-35.219727473, -24.796698321))
            ThreePointArc((-35.219727473, -24.796698321), (-35.102820214, -24.057290552), (-34.775449936, -23.384074497))
            ThreePointArc((-34.775449936, -23.384074497), (-34.222324259, -21.71206554), (-34.645346278, -20.0025))
            ThreePointArc((-34.645346278, -20.0025), (-35.914362456, -18.781369415), (-37.638927526, -18.424385824))
            ThreePointArc((-37.638927526, -18.424385824), (-38.385634871, -18.371288774), (-39.084434412, -18.102829545))
            Line((-39.084434412, -18.102829545), (-41.170667008, -16.92300591))
        make_face()
        with BuildLine():
            ThreePointArc((-37.638927526, 18.424385824), (-35.914362456, 18.781369415), (-34.645346278, 20.0025))
            ThreePointArc((-34.645346278, 20.0025), (-34.222324259, 21.71206554), (-34.775449936, 23.384074497))
            ThreePointArc((-34.775449936, 23.384074497), (-35.102820214, 24.057290552), (-35.219727473, 24.796698321))
            Line((-35.219727473, 24.796698321), (-35.24108653, 27.193340565))
            ThreePointArc((-35.24108653, 27.193340565), (-35.093576272, 28.069249714), (-34.653497089, 28.840810746))
            ThreePointArc((-34.653497089, 28.840810746), (-39.04475533, 22.5425), (-42.303623316, 15.590403436))
            ThreePointArc((-42.303623316, 15.590403436), (-41.855471454, 16.357303704), (-41.170667008, 16.92300591))
            Line((-41.170667008, 16.92300591), (-39.084434412, 18.102829545))
            ThreePointArc((-39.084434412, 18.102829545), (-38.385634871, 18.371288774), (-37.638927526, 18.424385824))
        make_face()
    extrude(amount=CIRPATTERN7_DEPTH, mode=Mode.SUBTRACT)


solid = part.part
